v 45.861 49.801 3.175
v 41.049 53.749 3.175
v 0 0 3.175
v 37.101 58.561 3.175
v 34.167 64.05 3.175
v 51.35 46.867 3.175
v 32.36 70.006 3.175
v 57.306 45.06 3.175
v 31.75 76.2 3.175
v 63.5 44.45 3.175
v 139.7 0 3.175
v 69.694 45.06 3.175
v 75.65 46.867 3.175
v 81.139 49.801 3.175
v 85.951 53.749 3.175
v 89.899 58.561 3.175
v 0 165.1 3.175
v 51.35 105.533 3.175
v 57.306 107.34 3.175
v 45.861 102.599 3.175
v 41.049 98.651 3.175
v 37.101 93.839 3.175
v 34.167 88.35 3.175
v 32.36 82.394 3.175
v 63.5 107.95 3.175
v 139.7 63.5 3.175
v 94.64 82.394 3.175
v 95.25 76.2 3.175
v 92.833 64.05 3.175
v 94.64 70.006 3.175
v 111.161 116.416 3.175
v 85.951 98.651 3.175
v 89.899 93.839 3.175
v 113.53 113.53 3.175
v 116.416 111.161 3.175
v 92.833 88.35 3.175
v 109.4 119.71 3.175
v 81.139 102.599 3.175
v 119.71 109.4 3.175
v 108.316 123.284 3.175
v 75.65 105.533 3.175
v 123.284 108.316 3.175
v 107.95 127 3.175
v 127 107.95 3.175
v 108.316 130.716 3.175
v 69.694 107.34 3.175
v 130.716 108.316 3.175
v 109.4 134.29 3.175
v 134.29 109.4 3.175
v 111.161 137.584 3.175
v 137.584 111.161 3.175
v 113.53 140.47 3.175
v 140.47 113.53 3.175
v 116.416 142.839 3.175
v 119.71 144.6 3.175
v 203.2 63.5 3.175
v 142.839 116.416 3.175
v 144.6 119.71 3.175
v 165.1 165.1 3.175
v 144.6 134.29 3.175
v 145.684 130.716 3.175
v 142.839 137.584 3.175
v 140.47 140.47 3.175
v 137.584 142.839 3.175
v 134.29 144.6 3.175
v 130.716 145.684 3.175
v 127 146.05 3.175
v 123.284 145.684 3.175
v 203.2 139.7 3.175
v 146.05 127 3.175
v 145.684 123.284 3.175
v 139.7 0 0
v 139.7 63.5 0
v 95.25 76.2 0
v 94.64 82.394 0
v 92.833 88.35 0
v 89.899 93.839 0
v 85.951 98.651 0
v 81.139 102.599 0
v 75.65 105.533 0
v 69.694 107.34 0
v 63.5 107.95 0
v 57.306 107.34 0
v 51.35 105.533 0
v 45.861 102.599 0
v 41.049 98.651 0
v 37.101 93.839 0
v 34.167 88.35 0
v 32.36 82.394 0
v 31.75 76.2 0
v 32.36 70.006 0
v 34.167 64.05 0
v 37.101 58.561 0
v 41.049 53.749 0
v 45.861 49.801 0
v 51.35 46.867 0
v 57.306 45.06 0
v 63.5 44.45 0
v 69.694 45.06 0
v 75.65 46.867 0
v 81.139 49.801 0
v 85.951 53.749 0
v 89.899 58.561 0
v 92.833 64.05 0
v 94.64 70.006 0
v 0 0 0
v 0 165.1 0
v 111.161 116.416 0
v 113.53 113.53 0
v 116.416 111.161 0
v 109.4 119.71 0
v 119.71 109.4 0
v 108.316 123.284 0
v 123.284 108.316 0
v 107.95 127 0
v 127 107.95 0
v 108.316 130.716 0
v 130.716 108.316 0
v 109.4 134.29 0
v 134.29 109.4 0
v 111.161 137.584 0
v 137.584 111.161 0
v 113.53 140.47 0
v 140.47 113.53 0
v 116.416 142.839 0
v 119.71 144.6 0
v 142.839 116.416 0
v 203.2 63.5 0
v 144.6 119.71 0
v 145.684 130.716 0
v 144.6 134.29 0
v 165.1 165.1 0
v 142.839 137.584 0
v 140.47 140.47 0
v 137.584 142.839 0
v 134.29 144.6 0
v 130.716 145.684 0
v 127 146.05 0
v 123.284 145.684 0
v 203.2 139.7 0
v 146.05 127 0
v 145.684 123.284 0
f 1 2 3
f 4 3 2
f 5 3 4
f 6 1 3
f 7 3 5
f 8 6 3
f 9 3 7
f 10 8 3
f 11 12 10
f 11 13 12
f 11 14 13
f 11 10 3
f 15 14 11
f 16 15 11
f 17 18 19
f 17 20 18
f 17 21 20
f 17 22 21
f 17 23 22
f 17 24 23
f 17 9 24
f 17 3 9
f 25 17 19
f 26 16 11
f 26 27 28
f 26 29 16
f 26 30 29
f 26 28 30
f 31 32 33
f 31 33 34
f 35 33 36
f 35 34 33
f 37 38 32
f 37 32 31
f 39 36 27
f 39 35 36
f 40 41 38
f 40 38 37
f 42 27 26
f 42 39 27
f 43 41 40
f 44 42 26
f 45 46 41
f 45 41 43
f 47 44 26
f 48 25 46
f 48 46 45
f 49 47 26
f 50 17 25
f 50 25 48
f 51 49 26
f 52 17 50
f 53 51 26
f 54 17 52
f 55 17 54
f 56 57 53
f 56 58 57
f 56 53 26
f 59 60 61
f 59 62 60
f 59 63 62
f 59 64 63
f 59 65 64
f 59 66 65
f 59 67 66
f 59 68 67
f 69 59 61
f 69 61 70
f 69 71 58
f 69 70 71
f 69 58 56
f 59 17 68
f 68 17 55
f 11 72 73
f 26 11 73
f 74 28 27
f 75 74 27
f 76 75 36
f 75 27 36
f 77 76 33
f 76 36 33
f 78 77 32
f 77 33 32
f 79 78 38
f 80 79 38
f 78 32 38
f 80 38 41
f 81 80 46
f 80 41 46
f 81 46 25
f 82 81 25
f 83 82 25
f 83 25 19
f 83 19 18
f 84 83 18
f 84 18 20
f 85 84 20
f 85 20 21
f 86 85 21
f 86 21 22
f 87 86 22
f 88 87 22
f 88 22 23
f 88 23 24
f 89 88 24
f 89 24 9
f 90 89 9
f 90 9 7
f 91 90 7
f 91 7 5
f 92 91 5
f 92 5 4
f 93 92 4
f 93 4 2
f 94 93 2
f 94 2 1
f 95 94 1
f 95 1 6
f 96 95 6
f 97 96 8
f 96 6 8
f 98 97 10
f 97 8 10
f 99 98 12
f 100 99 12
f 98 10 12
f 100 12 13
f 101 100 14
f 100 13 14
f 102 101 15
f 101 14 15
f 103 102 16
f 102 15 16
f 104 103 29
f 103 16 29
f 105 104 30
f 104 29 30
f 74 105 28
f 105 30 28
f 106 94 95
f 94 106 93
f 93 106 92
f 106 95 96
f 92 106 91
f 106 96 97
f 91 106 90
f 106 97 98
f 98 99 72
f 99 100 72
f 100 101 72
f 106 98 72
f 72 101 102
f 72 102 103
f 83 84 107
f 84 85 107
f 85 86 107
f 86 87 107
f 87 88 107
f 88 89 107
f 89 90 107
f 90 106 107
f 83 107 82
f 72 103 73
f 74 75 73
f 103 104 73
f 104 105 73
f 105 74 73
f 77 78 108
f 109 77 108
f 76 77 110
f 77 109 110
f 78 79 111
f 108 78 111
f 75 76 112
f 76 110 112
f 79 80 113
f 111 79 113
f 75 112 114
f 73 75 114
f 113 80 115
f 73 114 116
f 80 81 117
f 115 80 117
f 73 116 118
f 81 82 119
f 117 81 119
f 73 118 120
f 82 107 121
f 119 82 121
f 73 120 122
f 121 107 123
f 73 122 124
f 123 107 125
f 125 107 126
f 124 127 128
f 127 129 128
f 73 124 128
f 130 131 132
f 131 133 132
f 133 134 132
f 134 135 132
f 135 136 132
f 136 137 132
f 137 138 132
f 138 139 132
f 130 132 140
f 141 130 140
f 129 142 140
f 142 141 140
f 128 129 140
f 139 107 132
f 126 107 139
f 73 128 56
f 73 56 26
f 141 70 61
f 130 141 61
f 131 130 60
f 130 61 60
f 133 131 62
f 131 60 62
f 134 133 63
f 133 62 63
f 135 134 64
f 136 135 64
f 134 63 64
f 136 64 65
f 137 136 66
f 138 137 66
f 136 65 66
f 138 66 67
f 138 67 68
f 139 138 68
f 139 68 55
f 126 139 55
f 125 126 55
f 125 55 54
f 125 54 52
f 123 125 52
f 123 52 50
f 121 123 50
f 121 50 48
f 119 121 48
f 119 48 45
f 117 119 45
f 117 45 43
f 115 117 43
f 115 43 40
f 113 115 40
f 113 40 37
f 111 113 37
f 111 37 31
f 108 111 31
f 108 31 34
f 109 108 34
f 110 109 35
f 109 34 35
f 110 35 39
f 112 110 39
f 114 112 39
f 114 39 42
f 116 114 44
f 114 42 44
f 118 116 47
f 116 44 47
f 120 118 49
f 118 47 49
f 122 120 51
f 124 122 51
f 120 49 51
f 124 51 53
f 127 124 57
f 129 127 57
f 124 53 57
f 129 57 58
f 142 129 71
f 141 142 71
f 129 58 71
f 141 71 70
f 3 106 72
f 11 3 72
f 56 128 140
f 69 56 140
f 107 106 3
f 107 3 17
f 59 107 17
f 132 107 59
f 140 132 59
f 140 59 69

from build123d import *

# Parameters (mm, degrees)
SKETCH2_W               = 203.2
SKETCH2_H               = 165.1
BOSS_EXTRUDE1_DEPTH     = 3.175
CUT_EXTRUDE1_REACH      = 263.836
SKETCH6_W               = 63.5
SKETCH6_H               = 63.5
CUT_EXTRUDE3_DEPTH      = 262.836457784
CUT_EXTRUDE3_DEPTH_BACK = 262.836457784
SKETCH13_R              = 19.05
SKETCH13_R_2            = 31.75
CUT_EXTRUDE4_DEPTH      = 262.836457784


with BuildPart() as part:
    # Sketch2 → Boss-Extrude1 (new body)
    with BuildSketch(Plane.XY):
        with Locations((101.6, 82.55)):
            Rectangle(SKETCH2_W, SKETCH2_H)
    extrude(amount=BOSS_EXTRUDE1_DEPTH)

    # Sketch6 → Cut-Extrude1 (cut, up to next)
    with BuildSketch(Plane(origin=(0, 0, 0), x_dir=(-1, 0, 0), z_dir=(0, 0, -1)), mode=Mode.PRIVATE) as cut_extrude1_sk1:
        with Locations((-171.45, 31.75)):
            Rectangle(SKETCH6_W, SKETCH6_H)
    cut_extrude1_tool1 = extrude(cut_extrude1_sk1.sketch, amount=-CUT_EXTRUDE1_REACH, mode=Mode.PRIVATE) & part.part
    add(cut_extrude1_tool1.solids().sort_by_distance((171.45, 31.75, 0))[0], mode=Mode.SUBTRACT)

    # Sketch7 → Cut-Extrude3 (cut, two sides: drawn at the far end of the back side and taken through both)
    with BuildSketch(Plane.XY.offset(3.175).offset(-CUT_EXTRUDE3_DEPTH_BACK)):
        Polygon((-253.570061247, 444.213374165), (165.1, 165.1), (203.2, 139.7), (621.870061247, -139.413374165), (1180.096809576, 697.926748329), (304.656687082, 1281.553496659), align=None)
    extrude(amount=CUT_EXTRUDE3_DEPTH + CUT_EXTRUDE3_DEPTH_BACK, mode=Mode.SUBTRACT)

    # Sketch13 → Cut-Extrude4 (cut, through all)
    with BuildSketch(Plane.XY.offset(3.175)):
        with Locations((127, 127)):
            Circle(SKETCH13_R)
        with Locations((63.5, 76.2)):
            Circle(SKETCH13_R_2)
    extrude(amount=-CUT_EXTRUDE4_DEPTH, mode=Mode.SUBTRACT)


solid = part.part
